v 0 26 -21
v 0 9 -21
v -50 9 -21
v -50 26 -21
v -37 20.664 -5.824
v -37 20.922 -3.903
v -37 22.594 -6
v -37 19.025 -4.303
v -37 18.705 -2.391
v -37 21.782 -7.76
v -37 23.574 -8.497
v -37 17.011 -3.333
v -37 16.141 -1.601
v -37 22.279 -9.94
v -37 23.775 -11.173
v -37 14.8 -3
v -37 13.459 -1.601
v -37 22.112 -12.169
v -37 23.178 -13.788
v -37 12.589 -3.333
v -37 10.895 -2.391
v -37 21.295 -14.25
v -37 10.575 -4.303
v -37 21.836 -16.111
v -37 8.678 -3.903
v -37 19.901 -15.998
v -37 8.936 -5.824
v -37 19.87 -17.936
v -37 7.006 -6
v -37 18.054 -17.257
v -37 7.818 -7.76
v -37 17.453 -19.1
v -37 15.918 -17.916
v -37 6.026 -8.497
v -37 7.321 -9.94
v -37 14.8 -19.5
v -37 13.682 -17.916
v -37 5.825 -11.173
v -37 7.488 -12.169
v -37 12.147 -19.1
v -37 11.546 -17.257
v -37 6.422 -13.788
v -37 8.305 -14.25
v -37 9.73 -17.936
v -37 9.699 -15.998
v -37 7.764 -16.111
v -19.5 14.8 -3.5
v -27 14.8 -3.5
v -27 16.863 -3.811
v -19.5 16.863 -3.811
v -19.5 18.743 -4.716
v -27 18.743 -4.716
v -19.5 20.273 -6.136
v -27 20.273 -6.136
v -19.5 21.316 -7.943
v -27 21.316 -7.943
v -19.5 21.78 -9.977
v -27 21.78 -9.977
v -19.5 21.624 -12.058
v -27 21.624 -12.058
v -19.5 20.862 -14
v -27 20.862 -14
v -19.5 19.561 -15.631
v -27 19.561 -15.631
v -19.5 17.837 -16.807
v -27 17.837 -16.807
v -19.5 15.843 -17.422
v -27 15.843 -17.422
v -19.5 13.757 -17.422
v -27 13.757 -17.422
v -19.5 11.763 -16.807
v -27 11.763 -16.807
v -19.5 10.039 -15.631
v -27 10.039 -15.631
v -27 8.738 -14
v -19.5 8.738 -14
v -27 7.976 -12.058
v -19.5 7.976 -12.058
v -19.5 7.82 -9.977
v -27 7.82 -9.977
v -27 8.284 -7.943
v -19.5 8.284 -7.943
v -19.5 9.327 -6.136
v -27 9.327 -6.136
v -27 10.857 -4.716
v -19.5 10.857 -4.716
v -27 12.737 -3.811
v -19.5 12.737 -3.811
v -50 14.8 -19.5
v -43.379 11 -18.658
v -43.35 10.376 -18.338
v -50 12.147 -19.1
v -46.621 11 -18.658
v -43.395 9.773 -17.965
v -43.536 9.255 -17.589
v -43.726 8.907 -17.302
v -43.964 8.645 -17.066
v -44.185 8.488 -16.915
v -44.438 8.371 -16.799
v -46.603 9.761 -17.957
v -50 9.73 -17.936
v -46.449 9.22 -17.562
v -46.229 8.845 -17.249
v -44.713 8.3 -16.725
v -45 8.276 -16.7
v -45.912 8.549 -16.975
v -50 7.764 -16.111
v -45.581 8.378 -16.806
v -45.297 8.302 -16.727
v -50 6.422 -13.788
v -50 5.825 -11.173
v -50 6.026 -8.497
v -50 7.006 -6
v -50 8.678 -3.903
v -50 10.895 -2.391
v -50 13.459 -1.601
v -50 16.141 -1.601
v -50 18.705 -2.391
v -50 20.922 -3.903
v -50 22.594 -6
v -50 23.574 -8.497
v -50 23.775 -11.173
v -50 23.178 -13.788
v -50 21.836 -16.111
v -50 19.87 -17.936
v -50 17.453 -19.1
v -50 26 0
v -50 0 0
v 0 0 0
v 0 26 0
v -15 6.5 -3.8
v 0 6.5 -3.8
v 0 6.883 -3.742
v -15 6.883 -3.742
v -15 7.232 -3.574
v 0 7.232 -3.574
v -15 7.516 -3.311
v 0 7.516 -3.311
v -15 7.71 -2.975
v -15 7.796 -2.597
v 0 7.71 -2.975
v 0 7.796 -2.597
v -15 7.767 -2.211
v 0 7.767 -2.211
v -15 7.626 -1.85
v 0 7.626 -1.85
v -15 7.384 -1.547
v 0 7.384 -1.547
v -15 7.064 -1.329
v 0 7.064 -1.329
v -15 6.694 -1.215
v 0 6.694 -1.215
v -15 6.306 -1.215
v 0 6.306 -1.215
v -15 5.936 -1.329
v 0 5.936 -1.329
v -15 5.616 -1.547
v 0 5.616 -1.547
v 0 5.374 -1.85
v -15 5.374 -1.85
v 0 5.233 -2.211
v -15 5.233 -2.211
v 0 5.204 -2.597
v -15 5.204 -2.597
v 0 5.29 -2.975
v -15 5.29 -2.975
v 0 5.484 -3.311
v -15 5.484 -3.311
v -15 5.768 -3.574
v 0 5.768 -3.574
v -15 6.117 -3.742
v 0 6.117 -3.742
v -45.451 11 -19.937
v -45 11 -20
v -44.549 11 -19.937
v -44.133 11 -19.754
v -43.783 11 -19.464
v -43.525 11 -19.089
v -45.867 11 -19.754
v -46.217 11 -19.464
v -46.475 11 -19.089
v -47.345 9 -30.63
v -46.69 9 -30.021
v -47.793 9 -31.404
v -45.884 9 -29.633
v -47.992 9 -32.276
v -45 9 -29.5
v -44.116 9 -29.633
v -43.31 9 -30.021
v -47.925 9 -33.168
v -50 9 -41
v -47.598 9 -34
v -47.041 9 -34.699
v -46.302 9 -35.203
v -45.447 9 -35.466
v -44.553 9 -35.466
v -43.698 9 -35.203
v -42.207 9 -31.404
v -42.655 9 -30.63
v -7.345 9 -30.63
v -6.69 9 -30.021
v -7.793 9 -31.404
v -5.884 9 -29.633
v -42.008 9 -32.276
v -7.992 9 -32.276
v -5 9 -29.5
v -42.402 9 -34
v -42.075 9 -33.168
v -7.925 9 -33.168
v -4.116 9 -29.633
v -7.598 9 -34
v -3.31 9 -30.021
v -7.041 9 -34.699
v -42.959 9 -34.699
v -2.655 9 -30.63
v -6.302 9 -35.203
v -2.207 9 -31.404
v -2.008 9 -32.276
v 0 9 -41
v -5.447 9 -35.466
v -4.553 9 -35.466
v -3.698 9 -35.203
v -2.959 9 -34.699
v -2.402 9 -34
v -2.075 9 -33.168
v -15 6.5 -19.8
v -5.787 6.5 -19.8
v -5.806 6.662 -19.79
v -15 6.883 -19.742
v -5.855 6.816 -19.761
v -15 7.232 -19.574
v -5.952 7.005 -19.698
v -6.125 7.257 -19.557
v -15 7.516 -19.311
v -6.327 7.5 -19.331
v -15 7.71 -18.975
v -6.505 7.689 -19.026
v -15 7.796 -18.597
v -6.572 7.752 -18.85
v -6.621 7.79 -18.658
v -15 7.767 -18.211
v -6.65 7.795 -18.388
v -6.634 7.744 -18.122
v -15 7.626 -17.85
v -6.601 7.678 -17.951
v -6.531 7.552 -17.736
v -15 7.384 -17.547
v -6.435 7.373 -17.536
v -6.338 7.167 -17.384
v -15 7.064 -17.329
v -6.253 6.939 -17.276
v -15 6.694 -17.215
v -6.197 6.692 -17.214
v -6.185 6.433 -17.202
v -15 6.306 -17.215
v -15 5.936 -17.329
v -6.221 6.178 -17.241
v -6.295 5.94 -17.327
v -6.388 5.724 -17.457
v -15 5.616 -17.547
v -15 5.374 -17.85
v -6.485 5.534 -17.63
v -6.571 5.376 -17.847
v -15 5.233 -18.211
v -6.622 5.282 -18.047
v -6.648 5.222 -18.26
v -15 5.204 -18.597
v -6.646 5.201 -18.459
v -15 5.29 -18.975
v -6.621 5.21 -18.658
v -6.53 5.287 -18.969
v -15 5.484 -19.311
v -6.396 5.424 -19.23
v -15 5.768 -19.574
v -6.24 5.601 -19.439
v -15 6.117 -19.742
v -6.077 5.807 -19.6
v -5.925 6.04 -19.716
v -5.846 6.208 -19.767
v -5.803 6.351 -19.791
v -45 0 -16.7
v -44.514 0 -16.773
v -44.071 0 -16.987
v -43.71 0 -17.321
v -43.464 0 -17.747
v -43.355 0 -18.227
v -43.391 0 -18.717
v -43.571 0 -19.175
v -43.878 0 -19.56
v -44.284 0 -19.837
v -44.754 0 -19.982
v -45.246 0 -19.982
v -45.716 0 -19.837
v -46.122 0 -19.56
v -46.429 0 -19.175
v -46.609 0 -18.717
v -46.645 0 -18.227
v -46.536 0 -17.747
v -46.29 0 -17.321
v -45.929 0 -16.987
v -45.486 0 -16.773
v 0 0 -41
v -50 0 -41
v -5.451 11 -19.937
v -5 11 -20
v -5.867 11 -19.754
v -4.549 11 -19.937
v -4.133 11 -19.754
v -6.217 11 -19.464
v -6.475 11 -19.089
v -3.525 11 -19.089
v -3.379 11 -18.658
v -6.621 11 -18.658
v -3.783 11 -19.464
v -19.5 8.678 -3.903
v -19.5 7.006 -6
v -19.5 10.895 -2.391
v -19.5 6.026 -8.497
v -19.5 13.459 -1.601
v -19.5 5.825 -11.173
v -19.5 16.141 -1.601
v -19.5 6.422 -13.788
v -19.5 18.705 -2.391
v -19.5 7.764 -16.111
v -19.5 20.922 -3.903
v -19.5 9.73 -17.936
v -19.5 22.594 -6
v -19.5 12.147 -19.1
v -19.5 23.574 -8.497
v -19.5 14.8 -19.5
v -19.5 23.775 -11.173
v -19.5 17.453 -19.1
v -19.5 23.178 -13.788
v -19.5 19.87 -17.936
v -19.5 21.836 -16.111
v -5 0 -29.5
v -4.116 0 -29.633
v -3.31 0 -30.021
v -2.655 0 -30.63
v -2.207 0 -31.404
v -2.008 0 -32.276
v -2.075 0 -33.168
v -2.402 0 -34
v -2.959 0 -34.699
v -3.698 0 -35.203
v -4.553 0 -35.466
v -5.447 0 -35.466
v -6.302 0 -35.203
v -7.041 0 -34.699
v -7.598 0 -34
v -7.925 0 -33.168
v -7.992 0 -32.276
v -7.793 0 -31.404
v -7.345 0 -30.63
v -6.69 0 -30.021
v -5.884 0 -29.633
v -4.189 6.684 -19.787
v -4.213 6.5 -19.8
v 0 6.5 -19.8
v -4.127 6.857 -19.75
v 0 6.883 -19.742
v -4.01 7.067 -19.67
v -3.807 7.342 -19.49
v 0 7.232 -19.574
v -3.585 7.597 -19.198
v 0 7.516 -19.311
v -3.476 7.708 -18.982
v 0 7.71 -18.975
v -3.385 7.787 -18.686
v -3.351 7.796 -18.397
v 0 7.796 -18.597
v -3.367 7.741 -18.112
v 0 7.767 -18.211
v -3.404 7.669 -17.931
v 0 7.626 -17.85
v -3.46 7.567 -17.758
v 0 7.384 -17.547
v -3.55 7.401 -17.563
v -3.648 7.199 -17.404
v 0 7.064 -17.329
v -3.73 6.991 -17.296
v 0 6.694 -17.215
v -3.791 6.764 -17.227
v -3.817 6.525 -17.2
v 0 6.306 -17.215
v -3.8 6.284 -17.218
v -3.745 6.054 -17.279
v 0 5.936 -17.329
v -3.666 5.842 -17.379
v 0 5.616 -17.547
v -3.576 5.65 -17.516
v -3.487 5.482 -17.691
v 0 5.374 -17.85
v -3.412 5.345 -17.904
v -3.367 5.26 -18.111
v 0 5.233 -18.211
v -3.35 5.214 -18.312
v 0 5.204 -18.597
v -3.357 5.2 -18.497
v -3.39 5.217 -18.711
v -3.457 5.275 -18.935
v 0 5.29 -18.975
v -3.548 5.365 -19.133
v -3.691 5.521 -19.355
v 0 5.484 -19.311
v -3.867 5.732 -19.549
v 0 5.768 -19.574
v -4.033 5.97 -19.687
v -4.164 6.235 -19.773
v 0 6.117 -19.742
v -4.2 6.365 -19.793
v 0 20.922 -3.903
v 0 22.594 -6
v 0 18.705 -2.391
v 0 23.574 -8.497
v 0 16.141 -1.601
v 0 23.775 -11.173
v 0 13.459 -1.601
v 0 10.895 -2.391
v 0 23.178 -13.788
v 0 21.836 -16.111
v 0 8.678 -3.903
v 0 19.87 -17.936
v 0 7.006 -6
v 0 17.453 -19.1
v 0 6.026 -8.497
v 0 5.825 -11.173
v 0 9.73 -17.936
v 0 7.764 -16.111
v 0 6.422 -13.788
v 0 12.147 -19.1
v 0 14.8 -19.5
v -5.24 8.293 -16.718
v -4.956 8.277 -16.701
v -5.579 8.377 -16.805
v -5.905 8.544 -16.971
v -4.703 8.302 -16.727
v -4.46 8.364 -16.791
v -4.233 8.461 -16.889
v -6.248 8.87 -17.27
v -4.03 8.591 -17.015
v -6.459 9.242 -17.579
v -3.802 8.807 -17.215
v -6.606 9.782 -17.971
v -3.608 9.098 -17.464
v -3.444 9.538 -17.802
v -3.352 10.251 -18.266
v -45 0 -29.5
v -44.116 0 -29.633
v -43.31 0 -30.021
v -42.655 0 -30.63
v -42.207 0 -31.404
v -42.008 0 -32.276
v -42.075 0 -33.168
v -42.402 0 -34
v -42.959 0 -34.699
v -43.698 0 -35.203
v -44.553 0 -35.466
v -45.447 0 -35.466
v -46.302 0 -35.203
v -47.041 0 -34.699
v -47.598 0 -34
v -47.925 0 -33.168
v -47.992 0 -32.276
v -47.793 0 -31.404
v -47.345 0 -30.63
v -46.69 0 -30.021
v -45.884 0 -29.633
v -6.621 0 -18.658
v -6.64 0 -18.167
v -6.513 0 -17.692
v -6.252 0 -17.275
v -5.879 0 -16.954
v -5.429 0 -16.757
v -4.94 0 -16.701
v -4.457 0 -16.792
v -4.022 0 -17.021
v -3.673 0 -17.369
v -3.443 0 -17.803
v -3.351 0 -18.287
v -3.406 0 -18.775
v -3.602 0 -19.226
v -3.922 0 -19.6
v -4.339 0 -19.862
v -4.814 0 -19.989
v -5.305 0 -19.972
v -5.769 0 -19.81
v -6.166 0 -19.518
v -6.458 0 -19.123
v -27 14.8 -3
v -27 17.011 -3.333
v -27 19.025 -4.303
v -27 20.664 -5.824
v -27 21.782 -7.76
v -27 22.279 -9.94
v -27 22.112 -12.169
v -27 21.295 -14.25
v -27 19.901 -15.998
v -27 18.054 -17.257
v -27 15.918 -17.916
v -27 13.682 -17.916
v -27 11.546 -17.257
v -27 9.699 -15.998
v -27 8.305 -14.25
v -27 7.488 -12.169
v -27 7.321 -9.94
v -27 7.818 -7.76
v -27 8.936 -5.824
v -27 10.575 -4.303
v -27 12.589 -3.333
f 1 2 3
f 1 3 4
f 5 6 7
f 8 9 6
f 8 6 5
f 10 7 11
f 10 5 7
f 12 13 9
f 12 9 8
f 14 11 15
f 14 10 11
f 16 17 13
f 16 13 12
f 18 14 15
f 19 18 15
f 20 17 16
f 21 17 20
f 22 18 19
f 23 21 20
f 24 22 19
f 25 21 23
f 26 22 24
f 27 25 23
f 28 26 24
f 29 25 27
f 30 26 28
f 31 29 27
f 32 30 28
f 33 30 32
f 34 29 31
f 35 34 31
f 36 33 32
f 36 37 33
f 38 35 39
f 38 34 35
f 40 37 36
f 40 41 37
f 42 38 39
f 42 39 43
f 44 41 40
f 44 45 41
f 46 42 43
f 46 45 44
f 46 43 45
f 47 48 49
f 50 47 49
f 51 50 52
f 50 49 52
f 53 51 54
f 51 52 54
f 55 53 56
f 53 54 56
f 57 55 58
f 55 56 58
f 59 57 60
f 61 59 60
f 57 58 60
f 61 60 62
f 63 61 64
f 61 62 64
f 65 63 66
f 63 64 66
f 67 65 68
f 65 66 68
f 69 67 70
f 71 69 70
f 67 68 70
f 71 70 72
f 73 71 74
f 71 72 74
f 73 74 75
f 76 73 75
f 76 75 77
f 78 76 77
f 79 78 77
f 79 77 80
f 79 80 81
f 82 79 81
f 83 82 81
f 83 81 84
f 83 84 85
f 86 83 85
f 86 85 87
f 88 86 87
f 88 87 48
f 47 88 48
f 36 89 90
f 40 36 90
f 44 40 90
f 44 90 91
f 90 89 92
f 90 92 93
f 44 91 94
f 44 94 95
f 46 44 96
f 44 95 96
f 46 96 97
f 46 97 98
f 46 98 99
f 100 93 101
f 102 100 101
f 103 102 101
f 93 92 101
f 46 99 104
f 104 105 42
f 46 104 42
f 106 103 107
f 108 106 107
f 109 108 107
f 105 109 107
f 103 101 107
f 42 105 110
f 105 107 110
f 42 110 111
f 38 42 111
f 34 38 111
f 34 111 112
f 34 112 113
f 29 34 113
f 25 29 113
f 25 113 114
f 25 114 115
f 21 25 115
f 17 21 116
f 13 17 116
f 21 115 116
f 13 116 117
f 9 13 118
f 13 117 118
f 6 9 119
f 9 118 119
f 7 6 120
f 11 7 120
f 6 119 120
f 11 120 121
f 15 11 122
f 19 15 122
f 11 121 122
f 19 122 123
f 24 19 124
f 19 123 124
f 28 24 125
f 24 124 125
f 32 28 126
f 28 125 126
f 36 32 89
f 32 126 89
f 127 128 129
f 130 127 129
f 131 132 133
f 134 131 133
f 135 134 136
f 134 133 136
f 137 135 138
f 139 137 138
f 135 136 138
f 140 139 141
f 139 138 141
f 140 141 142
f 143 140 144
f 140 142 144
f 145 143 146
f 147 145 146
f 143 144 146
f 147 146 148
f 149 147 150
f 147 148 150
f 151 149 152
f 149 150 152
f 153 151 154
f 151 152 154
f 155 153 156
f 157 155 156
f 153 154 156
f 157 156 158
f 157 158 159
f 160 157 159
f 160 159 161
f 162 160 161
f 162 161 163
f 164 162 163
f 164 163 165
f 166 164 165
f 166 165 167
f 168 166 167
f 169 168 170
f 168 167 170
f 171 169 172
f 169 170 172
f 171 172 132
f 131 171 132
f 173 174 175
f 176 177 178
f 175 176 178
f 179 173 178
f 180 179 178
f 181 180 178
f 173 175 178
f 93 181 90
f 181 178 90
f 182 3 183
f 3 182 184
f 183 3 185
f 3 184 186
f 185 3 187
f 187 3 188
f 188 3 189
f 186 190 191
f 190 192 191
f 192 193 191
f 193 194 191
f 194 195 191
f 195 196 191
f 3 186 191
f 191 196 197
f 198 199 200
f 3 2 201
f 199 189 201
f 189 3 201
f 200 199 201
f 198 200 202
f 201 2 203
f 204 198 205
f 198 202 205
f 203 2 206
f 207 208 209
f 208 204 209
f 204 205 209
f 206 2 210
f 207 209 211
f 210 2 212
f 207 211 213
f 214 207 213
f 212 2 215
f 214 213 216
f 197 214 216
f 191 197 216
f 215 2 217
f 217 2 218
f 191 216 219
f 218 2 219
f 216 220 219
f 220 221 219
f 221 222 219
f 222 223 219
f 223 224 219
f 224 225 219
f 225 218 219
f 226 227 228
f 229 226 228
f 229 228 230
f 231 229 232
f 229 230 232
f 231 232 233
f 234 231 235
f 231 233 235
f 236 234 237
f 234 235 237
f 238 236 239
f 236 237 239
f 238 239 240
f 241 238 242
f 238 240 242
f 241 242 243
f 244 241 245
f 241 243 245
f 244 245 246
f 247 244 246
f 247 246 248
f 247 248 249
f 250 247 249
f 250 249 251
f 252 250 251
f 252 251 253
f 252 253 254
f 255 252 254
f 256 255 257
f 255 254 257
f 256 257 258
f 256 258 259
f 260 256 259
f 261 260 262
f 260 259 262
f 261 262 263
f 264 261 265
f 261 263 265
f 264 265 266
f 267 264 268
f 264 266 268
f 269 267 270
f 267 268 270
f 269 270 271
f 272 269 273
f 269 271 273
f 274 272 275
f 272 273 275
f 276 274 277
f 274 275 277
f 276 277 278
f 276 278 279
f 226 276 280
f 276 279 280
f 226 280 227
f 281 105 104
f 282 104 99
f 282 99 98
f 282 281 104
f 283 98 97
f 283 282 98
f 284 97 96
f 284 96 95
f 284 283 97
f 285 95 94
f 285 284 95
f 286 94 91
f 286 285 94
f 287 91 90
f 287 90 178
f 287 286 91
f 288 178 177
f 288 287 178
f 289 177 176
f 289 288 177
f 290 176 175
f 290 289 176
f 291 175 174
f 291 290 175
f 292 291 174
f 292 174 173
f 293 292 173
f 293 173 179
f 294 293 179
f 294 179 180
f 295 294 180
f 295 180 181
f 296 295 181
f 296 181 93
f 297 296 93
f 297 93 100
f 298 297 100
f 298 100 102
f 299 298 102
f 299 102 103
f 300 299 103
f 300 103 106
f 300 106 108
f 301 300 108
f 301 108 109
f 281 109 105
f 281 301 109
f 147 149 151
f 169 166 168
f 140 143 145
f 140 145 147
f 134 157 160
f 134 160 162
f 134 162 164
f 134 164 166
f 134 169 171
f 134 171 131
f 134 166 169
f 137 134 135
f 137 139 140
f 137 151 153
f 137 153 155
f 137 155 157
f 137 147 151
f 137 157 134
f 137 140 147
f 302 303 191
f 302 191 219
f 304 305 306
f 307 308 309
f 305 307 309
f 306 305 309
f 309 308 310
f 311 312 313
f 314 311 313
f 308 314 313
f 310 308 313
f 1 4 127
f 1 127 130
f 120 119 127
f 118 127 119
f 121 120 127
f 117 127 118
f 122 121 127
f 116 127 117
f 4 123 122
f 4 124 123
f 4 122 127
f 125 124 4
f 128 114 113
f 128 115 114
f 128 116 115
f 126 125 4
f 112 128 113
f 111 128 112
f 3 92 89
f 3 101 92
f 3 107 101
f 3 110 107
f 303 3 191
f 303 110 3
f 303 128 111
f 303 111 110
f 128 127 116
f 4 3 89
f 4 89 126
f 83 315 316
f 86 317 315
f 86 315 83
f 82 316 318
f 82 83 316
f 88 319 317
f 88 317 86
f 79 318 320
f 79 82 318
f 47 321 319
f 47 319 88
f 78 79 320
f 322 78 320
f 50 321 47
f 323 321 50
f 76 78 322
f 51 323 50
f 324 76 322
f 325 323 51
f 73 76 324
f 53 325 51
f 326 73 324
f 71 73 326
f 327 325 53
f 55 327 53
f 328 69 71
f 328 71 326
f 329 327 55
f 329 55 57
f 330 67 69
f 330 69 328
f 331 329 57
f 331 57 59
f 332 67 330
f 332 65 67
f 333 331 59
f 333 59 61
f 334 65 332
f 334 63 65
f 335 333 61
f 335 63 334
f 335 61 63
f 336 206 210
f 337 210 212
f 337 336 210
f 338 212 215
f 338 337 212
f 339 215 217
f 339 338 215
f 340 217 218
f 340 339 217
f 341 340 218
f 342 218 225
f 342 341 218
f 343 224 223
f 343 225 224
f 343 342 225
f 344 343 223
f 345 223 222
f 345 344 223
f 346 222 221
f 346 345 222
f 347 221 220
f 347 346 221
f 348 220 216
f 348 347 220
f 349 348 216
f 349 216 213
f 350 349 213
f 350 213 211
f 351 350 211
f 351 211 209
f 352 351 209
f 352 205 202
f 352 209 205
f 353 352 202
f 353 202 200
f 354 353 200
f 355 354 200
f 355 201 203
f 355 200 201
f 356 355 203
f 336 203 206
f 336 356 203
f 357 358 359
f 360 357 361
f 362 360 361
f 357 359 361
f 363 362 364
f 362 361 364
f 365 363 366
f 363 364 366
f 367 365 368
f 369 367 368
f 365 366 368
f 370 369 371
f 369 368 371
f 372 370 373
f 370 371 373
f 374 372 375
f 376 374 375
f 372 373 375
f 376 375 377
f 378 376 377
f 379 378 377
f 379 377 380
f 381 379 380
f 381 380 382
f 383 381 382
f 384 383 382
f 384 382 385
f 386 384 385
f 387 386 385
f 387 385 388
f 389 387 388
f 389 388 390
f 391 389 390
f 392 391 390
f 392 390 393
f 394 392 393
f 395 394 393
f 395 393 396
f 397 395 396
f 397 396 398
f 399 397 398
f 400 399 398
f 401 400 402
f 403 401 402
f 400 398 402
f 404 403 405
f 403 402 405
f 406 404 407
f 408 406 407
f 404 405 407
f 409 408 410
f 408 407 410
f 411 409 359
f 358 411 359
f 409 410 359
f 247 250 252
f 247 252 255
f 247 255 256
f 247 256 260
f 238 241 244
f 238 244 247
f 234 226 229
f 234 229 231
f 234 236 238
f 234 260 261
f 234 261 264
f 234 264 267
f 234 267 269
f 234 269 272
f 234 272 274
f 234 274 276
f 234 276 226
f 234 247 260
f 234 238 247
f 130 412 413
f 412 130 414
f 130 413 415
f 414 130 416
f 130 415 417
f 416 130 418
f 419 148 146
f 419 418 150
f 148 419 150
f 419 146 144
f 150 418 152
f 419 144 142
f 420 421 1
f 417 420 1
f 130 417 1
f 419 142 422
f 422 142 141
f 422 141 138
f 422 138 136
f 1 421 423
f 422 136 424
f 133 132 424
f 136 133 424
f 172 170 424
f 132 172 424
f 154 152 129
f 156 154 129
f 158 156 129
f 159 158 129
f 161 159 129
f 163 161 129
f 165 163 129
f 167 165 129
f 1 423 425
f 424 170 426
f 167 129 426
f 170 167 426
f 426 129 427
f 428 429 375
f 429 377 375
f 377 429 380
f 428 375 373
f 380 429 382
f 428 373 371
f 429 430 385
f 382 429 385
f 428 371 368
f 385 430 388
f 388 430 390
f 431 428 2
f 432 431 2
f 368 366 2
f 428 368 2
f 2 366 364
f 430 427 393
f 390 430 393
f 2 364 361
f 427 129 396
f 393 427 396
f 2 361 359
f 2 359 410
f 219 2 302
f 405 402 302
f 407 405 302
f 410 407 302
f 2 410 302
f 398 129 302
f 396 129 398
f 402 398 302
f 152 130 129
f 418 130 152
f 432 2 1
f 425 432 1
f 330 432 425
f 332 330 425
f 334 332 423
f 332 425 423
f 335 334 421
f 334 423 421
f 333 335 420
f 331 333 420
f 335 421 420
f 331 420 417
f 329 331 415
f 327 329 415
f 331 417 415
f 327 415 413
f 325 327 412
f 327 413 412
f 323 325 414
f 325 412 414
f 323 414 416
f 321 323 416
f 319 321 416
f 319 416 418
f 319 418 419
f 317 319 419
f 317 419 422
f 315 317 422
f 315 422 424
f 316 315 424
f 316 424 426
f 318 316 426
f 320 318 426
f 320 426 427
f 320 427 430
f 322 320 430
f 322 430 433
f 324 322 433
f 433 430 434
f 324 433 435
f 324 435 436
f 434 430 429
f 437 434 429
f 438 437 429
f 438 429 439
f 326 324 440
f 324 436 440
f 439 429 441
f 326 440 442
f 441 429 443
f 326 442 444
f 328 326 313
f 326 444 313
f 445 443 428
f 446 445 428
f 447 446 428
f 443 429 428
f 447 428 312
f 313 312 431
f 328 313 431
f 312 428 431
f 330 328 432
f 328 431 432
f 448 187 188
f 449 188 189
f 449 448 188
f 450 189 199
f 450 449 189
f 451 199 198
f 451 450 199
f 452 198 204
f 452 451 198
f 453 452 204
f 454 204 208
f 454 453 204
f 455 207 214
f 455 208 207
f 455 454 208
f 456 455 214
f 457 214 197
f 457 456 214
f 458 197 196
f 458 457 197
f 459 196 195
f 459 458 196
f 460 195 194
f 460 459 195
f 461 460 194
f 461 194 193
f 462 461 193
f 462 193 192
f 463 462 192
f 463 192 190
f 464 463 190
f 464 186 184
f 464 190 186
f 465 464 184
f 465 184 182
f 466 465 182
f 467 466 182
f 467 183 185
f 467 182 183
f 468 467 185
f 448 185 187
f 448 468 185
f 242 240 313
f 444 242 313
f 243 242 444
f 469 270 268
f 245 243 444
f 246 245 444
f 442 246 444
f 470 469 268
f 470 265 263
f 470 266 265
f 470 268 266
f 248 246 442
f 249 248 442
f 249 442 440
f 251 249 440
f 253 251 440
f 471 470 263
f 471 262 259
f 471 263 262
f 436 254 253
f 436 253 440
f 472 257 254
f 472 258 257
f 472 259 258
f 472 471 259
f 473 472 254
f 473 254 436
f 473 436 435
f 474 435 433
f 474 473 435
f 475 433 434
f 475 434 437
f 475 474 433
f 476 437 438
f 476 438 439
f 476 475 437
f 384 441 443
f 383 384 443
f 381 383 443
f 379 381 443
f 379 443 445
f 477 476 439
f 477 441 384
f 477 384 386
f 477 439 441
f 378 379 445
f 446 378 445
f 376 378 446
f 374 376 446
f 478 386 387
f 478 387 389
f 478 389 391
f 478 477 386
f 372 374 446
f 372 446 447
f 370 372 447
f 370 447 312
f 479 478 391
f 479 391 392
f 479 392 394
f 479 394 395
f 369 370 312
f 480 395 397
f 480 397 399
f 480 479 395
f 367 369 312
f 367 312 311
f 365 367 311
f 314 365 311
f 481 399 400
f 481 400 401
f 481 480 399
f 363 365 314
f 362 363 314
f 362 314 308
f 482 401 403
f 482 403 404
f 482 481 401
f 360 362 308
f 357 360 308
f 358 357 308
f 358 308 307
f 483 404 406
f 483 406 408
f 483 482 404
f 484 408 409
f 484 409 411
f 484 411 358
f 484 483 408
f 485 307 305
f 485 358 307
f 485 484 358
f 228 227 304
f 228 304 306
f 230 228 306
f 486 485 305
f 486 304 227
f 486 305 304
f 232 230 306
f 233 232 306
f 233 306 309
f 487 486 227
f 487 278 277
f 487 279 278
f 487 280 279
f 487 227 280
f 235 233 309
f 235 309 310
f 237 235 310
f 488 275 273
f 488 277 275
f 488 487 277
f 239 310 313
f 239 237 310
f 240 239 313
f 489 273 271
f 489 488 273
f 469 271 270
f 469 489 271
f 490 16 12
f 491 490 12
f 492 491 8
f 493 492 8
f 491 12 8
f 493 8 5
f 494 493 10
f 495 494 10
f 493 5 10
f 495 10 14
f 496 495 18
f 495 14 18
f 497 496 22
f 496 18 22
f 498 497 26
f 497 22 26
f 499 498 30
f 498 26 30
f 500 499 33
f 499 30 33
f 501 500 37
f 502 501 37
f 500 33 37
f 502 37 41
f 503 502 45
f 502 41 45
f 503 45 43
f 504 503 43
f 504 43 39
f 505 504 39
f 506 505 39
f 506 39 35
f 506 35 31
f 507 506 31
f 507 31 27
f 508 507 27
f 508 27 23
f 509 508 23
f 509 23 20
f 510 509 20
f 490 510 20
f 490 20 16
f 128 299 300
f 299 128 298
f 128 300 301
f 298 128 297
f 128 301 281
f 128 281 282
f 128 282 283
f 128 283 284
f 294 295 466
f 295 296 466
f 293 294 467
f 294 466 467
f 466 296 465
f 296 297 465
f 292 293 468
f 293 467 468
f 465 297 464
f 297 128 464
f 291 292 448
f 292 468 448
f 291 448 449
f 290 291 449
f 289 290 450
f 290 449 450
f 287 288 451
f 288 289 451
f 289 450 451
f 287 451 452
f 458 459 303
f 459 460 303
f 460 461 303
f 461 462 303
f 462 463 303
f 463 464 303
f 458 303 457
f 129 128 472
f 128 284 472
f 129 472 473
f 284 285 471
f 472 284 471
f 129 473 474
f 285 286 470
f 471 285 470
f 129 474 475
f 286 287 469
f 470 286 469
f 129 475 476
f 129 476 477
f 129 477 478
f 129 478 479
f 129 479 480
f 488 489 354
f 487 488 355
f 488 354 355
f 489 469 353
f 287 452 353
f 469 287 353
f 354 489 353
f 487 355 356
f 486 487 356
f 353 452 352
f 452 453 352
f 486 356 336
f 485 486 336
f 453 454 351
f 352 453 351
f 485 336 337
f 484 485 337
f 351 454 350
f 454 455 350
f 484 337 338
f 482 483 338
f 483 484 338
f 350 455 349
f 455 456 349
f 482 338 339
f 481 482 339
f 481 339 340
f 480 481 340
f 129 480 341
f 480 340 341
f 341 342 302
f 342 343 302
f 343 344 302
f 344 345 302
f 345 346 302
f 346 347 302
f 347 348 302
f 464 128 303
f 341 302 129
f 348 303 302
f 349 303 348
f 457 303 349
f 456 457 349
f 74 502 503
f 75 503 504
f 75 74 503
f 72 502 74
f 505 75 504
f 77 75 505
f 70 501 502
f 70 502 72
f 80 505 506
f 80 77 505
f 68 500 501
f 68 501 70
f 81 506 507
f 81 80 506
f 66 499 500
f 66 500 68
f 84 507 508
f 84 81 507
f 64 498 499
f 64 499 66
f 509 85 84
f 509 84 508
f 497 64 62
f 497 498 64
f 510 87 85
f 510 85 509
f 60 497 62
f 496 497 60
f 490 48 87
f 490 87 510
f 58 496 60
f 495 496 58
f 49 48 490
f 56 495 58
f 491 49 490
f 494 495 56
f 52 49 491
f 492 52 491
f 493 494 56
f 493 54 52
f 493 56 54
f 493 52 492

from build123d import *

# Parameters (mm, degrees)
ESQUISSE1_W             = 50
ESQUISSE1_H             = 41
ESQUISSE1_R             = 1.65
ESQUISSE1_R_2           = 3
BOSS_EXTRU_1_DEPTH      = 26
ESQUISSE2_W             = 20
ESQUISSE2_H             = 17
ENL_V_MAT_EXTRU_1_DEPTH = 51
ESQUISSE3_R             = 9
ENL_V_MAT_EXTRU_2_DEPTH = 19.5
ESQUISSE3_3_R           = 1.3
ENL_V_MAT_EXTRU_3_DEPTH = 15
ESQUISSE1_3_R           = 1.65
ENL_V_MAT_EXTRU_4_DEPTH = 11
ESQUISSE4_R             = 7
ENL_V_MAT_EXTRU_5_DEPTH = 51.0000001
ESQUISSE4_3_R           = 9
ENL_V_MAT_EXTRU_6_DEPTH = 13
ESQUISSE4_4_R           = 7.5
ENL_V_MAT_EXTRU_7_DEPTH = 23


with BuildPart() as part:
    # Esquisse1 → Boss.-Extru.1 (new body)
    with BuildSketch(Plane(origin=(0, 0, 0), x_dir=(1, 0, 0), z_dir=(0, 1, 0))):
        with Locations((-25, 20.5)):
            Rectangle(ESQUISSE1_W, ESQUISSE1_H)
        with Locations((-45, 18.35)):
            Circle(ESQUISSE1_R, mode=Mode.SUBTRACT)
        with Locations((-5, 18.35)):
            Circle(ESQUISSE1_R, mode=Mode.SUBTRACT)
        with Locations(Location((-5, 32.5, 0), (0, 0, 270))):  # turned: the seam where the file's is
            Circle(ESQUISSE1_R_2, mode=Mode.SUBTRACT)
        with Locations(Location((-45, 32.5, 0), (0, 0, 270))):  # turned: the seam where the file's is
            Circle(ESQUISSE1_R_2, mode=Mode.SUBTRACT)
        with Locations((-45, 18.35)):
            Circle(ESQUISSE1_R)
        with Locations((-5, 18.35)):
            Circle(ESQUISSE1_R)
    extrude(amount=BOSS_EXTRU_1_DEPTH)

    # Esquisse2 → Enl_v. mat.-Extru.1 (cut, through all)
    with BuildSketch(Plane(origin=(0, 0, 0), x_dir=(0, 0, -1), z_dir=(1, 0, 0))):
        with Locations((31, 17.5)):
            Rectangle(ESQUISSE2_W, ESQUISSE2_H)
    extrude(amount=-ENL_V_MAT_EXTRU_1_DEPTH, mode=Mode.SUBTRACT)

    # Esquisse3 → Enl_v. mat.-Extru.2 (cut)
    with BuildSketch(Plane(origin=(0, 0, 0), x_dir=(0, 0, -1), z_dir=(1, 0, 0))):
        with Locations((10.5, 14.8)):
            Circle(ESQUISSE3_R)
    extrude(amount=-ENL_V_MAT_EXTRU_2_DEPTH, mode=Mode.SUBTRACT)

    # Esquisse3_3 → Enl_v. mat.-Extru.3 (cut)
    with BuildSketch(Plane(origin=(0, 0, 0), x_dir=(0, 0, -1), z_dir=(1, 0, 0))):
        with Locations((2.5, 6.5)):
            Circle(ESQUISSE3_3_R)
        with Locations((18.5, 6.5)):
            Circle(ESQUISSE3_3_R)
    extrude(amount=-ENL_V_MAT_EXTRU_3_DEPTH, mode=Mode.SUBTRACT)

    # Esquisse1_3 → Enl_v. mat.-Extru.4 (cut)
    with BuildSketch(Plane(origin=(0, 0, 0), x_dir=(1, 0, 0), z_dir=(0, 1, 0))):
        with Locations(Location((-5, 18.35, 0), (0, 0, 169.22643943))):  # turned: the seam where the file's is
            Circle(ESQUISSE1_3_R)
        with Locations(Location((-45, 18.35, 0), (0, 0, 270))):  # turned: the seam where the file's is
            Circle(ESQUISSE1_3_R)
    extrude(amount=ENL_V_MAT_EXTRU_4_DEPTH, mode=Mode.SUBTRACT)

    # Esquisse4 → Enl_v. mat.-Extru.5 (cut, through all)
    with BuildSketch(Plane.ZY.offset(50)):
        with Locations((-10.5, 14.8)):
            Circle(ESQUISSE4_R)
    extrude(amount=-ENL_V_MAT_EXTRU_5_DEPTH, mode=Mode.SUBTRACT)

    # Esquisse4_3 → Enl_v. mat.-Extru.6 (cut)
    with BuildSketch(Plane.ZY.offset(50)):
        with Locations(Location((-10.5, 14.8, 0), (0, 0, 180))):  # turned: the seam where the file's is
            Circle(ESQUISSE4_3_R)
    extrude(amount=-ENL_V_MAT_EXTRU_6_DEPTH, mode=Mode.SUBTRACT)

    # Esquisse4_4 → Enl_v. mat.-Extru.7 (cut)
    with BuildSketch(Plane.ZY.offset(50)):
        with Locations((-10.5, 14.8)):
            Circle(ESQUISSE4_4_R)
    extrude(amount=-ENL_V_MAT_EXTRU_7_DEPTH, mode=Mode.SUBTRACT)


solid = part.part
